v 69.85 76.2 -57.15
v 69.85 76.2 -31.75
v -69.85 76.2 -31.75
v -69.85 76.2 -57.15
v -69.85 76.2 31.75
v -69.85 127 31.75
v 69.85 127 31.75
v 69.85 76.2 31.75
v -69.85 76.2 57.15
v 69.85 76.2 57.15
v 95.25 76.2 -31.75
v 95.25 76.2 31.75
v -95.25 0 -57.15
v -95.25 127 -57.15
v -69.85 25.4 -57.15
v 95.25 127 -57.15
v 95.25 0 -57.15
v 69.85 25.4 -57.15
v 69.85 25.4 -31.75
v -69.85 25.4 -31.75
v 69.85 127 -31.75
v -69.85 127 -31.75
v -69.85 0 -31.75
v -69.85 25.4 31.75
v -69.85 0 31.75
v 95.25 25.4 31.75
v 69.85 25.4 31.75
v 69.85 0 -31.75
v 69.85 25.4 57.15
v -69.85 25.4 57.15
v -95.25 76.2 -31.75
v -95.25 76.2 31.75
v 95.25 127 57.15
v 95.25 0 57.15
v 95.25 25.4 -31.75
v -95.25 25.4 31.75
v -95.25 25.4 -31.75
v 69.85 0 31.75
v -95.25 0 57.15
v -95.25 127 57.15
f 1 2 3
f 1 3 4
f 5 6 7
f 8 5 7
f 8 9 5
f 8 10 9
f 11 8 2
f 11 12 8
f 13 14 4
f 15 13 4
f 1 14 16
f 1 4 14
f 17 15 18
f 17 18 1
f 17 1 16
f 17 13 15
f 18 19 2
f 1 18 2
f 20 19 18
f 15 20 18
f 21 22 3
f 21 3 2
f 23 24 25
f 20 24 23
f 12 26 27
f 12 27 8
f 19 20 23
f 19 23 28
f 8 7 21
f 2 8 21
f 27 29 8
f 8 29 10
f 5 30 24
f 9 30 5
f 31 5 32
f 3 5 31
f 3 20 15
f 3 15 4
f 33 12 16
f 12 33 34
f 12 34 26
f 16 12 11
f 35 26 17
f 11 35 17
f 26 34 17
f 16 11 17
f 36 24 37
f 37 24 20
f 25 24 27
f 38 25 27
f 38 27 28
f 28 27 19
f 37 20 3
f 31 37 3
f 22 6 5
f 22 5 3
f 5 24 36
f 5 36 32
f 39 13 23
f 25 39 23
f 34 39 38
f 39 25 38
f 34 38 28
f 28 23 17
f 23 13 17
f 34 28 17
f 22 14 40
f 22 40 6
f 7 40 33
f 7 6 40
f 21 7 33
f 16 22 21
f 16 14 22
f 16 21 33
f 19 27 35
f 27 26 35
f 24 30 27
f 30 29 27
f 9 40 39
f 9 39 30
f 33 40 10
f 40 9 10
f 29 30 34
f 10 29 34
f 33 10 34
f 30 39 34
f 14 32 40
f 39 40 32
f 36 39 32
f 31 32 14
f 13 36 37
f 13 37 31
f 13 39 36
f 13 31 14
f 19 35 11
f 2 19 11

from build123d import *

# Parameters (mm, degrees)
SKETCH1_W           = 190.5
SKETCH1_H           = 114.3
BOSS_EXTRUDE1_DEPTH = 127
SKETCH2_W           = 139.7
SKETCH2_H           = 50.8
CUT_EXTRUDE1_DEPTH  = 196.61710687
SKETCH3_W           = 63.5
SKETCH3_H           = 50.8
CUT_EXTRUDE2_DEPTH  = 236.977483036
SKETCH4_W           = 139.7
SKETCH4_H           = 63.5
CUT_EXTRUDE3_DEPTH  = 169.723694246


with BuildPart() as part:
    # Sketch1 → Boss-Extrude1 (new body)
    with BuildSketch(Plane(origin=(0, 0, 0), x_dir=(1, 0, 0), z_dir=(0, 1, 0))):
        Rectangle(SKETCH1_W, SKETCH1_H)
    extrude(amount=BOSS_EXTRUDE1_DEPTH)

    # Sketch2 → Cut-Extrude1 (cut, through all)
    with BuildSketch(Plane.XY.offset(57.15)):
        with Locations((0, 50.8)):
            Rectangle(SKETCH2_W, SKETCH2_H)
    extrude(amount=-CUT_EXTRUDE1_DEPTH, mode=Mode.SUBTRACT)

    # Sketch3 → Cut-Extrude2 (cut, through all)
    with BuildSketch(Plane(origin=(95.25, 0, 0), x_dir=(0, 0, -1), z_dir=(1, 0, 0))):
        with Locations((0, 50.8)):
            Rectangle(SKETCH3_W, SKETCH3_H)
    extrude(amount=-CUT_EXTRUDE2_DEPTH, mode=Mode.SUBTRACT)

    # Sketch4 → Cut-Extrude3 (cut, through all)
    with BuildSketch(Plane(origin=(0, 127, 0), x_dir=(1, 0, 0), z_dir=(0, 1, 0))):
        Rectangle(SKETCH4_W, SKETCH4_H)
    extrude(amount=-CUT_EXTRUDE3_DEPTH, mode=Mode.SUBTRACT)


solid = part.part
